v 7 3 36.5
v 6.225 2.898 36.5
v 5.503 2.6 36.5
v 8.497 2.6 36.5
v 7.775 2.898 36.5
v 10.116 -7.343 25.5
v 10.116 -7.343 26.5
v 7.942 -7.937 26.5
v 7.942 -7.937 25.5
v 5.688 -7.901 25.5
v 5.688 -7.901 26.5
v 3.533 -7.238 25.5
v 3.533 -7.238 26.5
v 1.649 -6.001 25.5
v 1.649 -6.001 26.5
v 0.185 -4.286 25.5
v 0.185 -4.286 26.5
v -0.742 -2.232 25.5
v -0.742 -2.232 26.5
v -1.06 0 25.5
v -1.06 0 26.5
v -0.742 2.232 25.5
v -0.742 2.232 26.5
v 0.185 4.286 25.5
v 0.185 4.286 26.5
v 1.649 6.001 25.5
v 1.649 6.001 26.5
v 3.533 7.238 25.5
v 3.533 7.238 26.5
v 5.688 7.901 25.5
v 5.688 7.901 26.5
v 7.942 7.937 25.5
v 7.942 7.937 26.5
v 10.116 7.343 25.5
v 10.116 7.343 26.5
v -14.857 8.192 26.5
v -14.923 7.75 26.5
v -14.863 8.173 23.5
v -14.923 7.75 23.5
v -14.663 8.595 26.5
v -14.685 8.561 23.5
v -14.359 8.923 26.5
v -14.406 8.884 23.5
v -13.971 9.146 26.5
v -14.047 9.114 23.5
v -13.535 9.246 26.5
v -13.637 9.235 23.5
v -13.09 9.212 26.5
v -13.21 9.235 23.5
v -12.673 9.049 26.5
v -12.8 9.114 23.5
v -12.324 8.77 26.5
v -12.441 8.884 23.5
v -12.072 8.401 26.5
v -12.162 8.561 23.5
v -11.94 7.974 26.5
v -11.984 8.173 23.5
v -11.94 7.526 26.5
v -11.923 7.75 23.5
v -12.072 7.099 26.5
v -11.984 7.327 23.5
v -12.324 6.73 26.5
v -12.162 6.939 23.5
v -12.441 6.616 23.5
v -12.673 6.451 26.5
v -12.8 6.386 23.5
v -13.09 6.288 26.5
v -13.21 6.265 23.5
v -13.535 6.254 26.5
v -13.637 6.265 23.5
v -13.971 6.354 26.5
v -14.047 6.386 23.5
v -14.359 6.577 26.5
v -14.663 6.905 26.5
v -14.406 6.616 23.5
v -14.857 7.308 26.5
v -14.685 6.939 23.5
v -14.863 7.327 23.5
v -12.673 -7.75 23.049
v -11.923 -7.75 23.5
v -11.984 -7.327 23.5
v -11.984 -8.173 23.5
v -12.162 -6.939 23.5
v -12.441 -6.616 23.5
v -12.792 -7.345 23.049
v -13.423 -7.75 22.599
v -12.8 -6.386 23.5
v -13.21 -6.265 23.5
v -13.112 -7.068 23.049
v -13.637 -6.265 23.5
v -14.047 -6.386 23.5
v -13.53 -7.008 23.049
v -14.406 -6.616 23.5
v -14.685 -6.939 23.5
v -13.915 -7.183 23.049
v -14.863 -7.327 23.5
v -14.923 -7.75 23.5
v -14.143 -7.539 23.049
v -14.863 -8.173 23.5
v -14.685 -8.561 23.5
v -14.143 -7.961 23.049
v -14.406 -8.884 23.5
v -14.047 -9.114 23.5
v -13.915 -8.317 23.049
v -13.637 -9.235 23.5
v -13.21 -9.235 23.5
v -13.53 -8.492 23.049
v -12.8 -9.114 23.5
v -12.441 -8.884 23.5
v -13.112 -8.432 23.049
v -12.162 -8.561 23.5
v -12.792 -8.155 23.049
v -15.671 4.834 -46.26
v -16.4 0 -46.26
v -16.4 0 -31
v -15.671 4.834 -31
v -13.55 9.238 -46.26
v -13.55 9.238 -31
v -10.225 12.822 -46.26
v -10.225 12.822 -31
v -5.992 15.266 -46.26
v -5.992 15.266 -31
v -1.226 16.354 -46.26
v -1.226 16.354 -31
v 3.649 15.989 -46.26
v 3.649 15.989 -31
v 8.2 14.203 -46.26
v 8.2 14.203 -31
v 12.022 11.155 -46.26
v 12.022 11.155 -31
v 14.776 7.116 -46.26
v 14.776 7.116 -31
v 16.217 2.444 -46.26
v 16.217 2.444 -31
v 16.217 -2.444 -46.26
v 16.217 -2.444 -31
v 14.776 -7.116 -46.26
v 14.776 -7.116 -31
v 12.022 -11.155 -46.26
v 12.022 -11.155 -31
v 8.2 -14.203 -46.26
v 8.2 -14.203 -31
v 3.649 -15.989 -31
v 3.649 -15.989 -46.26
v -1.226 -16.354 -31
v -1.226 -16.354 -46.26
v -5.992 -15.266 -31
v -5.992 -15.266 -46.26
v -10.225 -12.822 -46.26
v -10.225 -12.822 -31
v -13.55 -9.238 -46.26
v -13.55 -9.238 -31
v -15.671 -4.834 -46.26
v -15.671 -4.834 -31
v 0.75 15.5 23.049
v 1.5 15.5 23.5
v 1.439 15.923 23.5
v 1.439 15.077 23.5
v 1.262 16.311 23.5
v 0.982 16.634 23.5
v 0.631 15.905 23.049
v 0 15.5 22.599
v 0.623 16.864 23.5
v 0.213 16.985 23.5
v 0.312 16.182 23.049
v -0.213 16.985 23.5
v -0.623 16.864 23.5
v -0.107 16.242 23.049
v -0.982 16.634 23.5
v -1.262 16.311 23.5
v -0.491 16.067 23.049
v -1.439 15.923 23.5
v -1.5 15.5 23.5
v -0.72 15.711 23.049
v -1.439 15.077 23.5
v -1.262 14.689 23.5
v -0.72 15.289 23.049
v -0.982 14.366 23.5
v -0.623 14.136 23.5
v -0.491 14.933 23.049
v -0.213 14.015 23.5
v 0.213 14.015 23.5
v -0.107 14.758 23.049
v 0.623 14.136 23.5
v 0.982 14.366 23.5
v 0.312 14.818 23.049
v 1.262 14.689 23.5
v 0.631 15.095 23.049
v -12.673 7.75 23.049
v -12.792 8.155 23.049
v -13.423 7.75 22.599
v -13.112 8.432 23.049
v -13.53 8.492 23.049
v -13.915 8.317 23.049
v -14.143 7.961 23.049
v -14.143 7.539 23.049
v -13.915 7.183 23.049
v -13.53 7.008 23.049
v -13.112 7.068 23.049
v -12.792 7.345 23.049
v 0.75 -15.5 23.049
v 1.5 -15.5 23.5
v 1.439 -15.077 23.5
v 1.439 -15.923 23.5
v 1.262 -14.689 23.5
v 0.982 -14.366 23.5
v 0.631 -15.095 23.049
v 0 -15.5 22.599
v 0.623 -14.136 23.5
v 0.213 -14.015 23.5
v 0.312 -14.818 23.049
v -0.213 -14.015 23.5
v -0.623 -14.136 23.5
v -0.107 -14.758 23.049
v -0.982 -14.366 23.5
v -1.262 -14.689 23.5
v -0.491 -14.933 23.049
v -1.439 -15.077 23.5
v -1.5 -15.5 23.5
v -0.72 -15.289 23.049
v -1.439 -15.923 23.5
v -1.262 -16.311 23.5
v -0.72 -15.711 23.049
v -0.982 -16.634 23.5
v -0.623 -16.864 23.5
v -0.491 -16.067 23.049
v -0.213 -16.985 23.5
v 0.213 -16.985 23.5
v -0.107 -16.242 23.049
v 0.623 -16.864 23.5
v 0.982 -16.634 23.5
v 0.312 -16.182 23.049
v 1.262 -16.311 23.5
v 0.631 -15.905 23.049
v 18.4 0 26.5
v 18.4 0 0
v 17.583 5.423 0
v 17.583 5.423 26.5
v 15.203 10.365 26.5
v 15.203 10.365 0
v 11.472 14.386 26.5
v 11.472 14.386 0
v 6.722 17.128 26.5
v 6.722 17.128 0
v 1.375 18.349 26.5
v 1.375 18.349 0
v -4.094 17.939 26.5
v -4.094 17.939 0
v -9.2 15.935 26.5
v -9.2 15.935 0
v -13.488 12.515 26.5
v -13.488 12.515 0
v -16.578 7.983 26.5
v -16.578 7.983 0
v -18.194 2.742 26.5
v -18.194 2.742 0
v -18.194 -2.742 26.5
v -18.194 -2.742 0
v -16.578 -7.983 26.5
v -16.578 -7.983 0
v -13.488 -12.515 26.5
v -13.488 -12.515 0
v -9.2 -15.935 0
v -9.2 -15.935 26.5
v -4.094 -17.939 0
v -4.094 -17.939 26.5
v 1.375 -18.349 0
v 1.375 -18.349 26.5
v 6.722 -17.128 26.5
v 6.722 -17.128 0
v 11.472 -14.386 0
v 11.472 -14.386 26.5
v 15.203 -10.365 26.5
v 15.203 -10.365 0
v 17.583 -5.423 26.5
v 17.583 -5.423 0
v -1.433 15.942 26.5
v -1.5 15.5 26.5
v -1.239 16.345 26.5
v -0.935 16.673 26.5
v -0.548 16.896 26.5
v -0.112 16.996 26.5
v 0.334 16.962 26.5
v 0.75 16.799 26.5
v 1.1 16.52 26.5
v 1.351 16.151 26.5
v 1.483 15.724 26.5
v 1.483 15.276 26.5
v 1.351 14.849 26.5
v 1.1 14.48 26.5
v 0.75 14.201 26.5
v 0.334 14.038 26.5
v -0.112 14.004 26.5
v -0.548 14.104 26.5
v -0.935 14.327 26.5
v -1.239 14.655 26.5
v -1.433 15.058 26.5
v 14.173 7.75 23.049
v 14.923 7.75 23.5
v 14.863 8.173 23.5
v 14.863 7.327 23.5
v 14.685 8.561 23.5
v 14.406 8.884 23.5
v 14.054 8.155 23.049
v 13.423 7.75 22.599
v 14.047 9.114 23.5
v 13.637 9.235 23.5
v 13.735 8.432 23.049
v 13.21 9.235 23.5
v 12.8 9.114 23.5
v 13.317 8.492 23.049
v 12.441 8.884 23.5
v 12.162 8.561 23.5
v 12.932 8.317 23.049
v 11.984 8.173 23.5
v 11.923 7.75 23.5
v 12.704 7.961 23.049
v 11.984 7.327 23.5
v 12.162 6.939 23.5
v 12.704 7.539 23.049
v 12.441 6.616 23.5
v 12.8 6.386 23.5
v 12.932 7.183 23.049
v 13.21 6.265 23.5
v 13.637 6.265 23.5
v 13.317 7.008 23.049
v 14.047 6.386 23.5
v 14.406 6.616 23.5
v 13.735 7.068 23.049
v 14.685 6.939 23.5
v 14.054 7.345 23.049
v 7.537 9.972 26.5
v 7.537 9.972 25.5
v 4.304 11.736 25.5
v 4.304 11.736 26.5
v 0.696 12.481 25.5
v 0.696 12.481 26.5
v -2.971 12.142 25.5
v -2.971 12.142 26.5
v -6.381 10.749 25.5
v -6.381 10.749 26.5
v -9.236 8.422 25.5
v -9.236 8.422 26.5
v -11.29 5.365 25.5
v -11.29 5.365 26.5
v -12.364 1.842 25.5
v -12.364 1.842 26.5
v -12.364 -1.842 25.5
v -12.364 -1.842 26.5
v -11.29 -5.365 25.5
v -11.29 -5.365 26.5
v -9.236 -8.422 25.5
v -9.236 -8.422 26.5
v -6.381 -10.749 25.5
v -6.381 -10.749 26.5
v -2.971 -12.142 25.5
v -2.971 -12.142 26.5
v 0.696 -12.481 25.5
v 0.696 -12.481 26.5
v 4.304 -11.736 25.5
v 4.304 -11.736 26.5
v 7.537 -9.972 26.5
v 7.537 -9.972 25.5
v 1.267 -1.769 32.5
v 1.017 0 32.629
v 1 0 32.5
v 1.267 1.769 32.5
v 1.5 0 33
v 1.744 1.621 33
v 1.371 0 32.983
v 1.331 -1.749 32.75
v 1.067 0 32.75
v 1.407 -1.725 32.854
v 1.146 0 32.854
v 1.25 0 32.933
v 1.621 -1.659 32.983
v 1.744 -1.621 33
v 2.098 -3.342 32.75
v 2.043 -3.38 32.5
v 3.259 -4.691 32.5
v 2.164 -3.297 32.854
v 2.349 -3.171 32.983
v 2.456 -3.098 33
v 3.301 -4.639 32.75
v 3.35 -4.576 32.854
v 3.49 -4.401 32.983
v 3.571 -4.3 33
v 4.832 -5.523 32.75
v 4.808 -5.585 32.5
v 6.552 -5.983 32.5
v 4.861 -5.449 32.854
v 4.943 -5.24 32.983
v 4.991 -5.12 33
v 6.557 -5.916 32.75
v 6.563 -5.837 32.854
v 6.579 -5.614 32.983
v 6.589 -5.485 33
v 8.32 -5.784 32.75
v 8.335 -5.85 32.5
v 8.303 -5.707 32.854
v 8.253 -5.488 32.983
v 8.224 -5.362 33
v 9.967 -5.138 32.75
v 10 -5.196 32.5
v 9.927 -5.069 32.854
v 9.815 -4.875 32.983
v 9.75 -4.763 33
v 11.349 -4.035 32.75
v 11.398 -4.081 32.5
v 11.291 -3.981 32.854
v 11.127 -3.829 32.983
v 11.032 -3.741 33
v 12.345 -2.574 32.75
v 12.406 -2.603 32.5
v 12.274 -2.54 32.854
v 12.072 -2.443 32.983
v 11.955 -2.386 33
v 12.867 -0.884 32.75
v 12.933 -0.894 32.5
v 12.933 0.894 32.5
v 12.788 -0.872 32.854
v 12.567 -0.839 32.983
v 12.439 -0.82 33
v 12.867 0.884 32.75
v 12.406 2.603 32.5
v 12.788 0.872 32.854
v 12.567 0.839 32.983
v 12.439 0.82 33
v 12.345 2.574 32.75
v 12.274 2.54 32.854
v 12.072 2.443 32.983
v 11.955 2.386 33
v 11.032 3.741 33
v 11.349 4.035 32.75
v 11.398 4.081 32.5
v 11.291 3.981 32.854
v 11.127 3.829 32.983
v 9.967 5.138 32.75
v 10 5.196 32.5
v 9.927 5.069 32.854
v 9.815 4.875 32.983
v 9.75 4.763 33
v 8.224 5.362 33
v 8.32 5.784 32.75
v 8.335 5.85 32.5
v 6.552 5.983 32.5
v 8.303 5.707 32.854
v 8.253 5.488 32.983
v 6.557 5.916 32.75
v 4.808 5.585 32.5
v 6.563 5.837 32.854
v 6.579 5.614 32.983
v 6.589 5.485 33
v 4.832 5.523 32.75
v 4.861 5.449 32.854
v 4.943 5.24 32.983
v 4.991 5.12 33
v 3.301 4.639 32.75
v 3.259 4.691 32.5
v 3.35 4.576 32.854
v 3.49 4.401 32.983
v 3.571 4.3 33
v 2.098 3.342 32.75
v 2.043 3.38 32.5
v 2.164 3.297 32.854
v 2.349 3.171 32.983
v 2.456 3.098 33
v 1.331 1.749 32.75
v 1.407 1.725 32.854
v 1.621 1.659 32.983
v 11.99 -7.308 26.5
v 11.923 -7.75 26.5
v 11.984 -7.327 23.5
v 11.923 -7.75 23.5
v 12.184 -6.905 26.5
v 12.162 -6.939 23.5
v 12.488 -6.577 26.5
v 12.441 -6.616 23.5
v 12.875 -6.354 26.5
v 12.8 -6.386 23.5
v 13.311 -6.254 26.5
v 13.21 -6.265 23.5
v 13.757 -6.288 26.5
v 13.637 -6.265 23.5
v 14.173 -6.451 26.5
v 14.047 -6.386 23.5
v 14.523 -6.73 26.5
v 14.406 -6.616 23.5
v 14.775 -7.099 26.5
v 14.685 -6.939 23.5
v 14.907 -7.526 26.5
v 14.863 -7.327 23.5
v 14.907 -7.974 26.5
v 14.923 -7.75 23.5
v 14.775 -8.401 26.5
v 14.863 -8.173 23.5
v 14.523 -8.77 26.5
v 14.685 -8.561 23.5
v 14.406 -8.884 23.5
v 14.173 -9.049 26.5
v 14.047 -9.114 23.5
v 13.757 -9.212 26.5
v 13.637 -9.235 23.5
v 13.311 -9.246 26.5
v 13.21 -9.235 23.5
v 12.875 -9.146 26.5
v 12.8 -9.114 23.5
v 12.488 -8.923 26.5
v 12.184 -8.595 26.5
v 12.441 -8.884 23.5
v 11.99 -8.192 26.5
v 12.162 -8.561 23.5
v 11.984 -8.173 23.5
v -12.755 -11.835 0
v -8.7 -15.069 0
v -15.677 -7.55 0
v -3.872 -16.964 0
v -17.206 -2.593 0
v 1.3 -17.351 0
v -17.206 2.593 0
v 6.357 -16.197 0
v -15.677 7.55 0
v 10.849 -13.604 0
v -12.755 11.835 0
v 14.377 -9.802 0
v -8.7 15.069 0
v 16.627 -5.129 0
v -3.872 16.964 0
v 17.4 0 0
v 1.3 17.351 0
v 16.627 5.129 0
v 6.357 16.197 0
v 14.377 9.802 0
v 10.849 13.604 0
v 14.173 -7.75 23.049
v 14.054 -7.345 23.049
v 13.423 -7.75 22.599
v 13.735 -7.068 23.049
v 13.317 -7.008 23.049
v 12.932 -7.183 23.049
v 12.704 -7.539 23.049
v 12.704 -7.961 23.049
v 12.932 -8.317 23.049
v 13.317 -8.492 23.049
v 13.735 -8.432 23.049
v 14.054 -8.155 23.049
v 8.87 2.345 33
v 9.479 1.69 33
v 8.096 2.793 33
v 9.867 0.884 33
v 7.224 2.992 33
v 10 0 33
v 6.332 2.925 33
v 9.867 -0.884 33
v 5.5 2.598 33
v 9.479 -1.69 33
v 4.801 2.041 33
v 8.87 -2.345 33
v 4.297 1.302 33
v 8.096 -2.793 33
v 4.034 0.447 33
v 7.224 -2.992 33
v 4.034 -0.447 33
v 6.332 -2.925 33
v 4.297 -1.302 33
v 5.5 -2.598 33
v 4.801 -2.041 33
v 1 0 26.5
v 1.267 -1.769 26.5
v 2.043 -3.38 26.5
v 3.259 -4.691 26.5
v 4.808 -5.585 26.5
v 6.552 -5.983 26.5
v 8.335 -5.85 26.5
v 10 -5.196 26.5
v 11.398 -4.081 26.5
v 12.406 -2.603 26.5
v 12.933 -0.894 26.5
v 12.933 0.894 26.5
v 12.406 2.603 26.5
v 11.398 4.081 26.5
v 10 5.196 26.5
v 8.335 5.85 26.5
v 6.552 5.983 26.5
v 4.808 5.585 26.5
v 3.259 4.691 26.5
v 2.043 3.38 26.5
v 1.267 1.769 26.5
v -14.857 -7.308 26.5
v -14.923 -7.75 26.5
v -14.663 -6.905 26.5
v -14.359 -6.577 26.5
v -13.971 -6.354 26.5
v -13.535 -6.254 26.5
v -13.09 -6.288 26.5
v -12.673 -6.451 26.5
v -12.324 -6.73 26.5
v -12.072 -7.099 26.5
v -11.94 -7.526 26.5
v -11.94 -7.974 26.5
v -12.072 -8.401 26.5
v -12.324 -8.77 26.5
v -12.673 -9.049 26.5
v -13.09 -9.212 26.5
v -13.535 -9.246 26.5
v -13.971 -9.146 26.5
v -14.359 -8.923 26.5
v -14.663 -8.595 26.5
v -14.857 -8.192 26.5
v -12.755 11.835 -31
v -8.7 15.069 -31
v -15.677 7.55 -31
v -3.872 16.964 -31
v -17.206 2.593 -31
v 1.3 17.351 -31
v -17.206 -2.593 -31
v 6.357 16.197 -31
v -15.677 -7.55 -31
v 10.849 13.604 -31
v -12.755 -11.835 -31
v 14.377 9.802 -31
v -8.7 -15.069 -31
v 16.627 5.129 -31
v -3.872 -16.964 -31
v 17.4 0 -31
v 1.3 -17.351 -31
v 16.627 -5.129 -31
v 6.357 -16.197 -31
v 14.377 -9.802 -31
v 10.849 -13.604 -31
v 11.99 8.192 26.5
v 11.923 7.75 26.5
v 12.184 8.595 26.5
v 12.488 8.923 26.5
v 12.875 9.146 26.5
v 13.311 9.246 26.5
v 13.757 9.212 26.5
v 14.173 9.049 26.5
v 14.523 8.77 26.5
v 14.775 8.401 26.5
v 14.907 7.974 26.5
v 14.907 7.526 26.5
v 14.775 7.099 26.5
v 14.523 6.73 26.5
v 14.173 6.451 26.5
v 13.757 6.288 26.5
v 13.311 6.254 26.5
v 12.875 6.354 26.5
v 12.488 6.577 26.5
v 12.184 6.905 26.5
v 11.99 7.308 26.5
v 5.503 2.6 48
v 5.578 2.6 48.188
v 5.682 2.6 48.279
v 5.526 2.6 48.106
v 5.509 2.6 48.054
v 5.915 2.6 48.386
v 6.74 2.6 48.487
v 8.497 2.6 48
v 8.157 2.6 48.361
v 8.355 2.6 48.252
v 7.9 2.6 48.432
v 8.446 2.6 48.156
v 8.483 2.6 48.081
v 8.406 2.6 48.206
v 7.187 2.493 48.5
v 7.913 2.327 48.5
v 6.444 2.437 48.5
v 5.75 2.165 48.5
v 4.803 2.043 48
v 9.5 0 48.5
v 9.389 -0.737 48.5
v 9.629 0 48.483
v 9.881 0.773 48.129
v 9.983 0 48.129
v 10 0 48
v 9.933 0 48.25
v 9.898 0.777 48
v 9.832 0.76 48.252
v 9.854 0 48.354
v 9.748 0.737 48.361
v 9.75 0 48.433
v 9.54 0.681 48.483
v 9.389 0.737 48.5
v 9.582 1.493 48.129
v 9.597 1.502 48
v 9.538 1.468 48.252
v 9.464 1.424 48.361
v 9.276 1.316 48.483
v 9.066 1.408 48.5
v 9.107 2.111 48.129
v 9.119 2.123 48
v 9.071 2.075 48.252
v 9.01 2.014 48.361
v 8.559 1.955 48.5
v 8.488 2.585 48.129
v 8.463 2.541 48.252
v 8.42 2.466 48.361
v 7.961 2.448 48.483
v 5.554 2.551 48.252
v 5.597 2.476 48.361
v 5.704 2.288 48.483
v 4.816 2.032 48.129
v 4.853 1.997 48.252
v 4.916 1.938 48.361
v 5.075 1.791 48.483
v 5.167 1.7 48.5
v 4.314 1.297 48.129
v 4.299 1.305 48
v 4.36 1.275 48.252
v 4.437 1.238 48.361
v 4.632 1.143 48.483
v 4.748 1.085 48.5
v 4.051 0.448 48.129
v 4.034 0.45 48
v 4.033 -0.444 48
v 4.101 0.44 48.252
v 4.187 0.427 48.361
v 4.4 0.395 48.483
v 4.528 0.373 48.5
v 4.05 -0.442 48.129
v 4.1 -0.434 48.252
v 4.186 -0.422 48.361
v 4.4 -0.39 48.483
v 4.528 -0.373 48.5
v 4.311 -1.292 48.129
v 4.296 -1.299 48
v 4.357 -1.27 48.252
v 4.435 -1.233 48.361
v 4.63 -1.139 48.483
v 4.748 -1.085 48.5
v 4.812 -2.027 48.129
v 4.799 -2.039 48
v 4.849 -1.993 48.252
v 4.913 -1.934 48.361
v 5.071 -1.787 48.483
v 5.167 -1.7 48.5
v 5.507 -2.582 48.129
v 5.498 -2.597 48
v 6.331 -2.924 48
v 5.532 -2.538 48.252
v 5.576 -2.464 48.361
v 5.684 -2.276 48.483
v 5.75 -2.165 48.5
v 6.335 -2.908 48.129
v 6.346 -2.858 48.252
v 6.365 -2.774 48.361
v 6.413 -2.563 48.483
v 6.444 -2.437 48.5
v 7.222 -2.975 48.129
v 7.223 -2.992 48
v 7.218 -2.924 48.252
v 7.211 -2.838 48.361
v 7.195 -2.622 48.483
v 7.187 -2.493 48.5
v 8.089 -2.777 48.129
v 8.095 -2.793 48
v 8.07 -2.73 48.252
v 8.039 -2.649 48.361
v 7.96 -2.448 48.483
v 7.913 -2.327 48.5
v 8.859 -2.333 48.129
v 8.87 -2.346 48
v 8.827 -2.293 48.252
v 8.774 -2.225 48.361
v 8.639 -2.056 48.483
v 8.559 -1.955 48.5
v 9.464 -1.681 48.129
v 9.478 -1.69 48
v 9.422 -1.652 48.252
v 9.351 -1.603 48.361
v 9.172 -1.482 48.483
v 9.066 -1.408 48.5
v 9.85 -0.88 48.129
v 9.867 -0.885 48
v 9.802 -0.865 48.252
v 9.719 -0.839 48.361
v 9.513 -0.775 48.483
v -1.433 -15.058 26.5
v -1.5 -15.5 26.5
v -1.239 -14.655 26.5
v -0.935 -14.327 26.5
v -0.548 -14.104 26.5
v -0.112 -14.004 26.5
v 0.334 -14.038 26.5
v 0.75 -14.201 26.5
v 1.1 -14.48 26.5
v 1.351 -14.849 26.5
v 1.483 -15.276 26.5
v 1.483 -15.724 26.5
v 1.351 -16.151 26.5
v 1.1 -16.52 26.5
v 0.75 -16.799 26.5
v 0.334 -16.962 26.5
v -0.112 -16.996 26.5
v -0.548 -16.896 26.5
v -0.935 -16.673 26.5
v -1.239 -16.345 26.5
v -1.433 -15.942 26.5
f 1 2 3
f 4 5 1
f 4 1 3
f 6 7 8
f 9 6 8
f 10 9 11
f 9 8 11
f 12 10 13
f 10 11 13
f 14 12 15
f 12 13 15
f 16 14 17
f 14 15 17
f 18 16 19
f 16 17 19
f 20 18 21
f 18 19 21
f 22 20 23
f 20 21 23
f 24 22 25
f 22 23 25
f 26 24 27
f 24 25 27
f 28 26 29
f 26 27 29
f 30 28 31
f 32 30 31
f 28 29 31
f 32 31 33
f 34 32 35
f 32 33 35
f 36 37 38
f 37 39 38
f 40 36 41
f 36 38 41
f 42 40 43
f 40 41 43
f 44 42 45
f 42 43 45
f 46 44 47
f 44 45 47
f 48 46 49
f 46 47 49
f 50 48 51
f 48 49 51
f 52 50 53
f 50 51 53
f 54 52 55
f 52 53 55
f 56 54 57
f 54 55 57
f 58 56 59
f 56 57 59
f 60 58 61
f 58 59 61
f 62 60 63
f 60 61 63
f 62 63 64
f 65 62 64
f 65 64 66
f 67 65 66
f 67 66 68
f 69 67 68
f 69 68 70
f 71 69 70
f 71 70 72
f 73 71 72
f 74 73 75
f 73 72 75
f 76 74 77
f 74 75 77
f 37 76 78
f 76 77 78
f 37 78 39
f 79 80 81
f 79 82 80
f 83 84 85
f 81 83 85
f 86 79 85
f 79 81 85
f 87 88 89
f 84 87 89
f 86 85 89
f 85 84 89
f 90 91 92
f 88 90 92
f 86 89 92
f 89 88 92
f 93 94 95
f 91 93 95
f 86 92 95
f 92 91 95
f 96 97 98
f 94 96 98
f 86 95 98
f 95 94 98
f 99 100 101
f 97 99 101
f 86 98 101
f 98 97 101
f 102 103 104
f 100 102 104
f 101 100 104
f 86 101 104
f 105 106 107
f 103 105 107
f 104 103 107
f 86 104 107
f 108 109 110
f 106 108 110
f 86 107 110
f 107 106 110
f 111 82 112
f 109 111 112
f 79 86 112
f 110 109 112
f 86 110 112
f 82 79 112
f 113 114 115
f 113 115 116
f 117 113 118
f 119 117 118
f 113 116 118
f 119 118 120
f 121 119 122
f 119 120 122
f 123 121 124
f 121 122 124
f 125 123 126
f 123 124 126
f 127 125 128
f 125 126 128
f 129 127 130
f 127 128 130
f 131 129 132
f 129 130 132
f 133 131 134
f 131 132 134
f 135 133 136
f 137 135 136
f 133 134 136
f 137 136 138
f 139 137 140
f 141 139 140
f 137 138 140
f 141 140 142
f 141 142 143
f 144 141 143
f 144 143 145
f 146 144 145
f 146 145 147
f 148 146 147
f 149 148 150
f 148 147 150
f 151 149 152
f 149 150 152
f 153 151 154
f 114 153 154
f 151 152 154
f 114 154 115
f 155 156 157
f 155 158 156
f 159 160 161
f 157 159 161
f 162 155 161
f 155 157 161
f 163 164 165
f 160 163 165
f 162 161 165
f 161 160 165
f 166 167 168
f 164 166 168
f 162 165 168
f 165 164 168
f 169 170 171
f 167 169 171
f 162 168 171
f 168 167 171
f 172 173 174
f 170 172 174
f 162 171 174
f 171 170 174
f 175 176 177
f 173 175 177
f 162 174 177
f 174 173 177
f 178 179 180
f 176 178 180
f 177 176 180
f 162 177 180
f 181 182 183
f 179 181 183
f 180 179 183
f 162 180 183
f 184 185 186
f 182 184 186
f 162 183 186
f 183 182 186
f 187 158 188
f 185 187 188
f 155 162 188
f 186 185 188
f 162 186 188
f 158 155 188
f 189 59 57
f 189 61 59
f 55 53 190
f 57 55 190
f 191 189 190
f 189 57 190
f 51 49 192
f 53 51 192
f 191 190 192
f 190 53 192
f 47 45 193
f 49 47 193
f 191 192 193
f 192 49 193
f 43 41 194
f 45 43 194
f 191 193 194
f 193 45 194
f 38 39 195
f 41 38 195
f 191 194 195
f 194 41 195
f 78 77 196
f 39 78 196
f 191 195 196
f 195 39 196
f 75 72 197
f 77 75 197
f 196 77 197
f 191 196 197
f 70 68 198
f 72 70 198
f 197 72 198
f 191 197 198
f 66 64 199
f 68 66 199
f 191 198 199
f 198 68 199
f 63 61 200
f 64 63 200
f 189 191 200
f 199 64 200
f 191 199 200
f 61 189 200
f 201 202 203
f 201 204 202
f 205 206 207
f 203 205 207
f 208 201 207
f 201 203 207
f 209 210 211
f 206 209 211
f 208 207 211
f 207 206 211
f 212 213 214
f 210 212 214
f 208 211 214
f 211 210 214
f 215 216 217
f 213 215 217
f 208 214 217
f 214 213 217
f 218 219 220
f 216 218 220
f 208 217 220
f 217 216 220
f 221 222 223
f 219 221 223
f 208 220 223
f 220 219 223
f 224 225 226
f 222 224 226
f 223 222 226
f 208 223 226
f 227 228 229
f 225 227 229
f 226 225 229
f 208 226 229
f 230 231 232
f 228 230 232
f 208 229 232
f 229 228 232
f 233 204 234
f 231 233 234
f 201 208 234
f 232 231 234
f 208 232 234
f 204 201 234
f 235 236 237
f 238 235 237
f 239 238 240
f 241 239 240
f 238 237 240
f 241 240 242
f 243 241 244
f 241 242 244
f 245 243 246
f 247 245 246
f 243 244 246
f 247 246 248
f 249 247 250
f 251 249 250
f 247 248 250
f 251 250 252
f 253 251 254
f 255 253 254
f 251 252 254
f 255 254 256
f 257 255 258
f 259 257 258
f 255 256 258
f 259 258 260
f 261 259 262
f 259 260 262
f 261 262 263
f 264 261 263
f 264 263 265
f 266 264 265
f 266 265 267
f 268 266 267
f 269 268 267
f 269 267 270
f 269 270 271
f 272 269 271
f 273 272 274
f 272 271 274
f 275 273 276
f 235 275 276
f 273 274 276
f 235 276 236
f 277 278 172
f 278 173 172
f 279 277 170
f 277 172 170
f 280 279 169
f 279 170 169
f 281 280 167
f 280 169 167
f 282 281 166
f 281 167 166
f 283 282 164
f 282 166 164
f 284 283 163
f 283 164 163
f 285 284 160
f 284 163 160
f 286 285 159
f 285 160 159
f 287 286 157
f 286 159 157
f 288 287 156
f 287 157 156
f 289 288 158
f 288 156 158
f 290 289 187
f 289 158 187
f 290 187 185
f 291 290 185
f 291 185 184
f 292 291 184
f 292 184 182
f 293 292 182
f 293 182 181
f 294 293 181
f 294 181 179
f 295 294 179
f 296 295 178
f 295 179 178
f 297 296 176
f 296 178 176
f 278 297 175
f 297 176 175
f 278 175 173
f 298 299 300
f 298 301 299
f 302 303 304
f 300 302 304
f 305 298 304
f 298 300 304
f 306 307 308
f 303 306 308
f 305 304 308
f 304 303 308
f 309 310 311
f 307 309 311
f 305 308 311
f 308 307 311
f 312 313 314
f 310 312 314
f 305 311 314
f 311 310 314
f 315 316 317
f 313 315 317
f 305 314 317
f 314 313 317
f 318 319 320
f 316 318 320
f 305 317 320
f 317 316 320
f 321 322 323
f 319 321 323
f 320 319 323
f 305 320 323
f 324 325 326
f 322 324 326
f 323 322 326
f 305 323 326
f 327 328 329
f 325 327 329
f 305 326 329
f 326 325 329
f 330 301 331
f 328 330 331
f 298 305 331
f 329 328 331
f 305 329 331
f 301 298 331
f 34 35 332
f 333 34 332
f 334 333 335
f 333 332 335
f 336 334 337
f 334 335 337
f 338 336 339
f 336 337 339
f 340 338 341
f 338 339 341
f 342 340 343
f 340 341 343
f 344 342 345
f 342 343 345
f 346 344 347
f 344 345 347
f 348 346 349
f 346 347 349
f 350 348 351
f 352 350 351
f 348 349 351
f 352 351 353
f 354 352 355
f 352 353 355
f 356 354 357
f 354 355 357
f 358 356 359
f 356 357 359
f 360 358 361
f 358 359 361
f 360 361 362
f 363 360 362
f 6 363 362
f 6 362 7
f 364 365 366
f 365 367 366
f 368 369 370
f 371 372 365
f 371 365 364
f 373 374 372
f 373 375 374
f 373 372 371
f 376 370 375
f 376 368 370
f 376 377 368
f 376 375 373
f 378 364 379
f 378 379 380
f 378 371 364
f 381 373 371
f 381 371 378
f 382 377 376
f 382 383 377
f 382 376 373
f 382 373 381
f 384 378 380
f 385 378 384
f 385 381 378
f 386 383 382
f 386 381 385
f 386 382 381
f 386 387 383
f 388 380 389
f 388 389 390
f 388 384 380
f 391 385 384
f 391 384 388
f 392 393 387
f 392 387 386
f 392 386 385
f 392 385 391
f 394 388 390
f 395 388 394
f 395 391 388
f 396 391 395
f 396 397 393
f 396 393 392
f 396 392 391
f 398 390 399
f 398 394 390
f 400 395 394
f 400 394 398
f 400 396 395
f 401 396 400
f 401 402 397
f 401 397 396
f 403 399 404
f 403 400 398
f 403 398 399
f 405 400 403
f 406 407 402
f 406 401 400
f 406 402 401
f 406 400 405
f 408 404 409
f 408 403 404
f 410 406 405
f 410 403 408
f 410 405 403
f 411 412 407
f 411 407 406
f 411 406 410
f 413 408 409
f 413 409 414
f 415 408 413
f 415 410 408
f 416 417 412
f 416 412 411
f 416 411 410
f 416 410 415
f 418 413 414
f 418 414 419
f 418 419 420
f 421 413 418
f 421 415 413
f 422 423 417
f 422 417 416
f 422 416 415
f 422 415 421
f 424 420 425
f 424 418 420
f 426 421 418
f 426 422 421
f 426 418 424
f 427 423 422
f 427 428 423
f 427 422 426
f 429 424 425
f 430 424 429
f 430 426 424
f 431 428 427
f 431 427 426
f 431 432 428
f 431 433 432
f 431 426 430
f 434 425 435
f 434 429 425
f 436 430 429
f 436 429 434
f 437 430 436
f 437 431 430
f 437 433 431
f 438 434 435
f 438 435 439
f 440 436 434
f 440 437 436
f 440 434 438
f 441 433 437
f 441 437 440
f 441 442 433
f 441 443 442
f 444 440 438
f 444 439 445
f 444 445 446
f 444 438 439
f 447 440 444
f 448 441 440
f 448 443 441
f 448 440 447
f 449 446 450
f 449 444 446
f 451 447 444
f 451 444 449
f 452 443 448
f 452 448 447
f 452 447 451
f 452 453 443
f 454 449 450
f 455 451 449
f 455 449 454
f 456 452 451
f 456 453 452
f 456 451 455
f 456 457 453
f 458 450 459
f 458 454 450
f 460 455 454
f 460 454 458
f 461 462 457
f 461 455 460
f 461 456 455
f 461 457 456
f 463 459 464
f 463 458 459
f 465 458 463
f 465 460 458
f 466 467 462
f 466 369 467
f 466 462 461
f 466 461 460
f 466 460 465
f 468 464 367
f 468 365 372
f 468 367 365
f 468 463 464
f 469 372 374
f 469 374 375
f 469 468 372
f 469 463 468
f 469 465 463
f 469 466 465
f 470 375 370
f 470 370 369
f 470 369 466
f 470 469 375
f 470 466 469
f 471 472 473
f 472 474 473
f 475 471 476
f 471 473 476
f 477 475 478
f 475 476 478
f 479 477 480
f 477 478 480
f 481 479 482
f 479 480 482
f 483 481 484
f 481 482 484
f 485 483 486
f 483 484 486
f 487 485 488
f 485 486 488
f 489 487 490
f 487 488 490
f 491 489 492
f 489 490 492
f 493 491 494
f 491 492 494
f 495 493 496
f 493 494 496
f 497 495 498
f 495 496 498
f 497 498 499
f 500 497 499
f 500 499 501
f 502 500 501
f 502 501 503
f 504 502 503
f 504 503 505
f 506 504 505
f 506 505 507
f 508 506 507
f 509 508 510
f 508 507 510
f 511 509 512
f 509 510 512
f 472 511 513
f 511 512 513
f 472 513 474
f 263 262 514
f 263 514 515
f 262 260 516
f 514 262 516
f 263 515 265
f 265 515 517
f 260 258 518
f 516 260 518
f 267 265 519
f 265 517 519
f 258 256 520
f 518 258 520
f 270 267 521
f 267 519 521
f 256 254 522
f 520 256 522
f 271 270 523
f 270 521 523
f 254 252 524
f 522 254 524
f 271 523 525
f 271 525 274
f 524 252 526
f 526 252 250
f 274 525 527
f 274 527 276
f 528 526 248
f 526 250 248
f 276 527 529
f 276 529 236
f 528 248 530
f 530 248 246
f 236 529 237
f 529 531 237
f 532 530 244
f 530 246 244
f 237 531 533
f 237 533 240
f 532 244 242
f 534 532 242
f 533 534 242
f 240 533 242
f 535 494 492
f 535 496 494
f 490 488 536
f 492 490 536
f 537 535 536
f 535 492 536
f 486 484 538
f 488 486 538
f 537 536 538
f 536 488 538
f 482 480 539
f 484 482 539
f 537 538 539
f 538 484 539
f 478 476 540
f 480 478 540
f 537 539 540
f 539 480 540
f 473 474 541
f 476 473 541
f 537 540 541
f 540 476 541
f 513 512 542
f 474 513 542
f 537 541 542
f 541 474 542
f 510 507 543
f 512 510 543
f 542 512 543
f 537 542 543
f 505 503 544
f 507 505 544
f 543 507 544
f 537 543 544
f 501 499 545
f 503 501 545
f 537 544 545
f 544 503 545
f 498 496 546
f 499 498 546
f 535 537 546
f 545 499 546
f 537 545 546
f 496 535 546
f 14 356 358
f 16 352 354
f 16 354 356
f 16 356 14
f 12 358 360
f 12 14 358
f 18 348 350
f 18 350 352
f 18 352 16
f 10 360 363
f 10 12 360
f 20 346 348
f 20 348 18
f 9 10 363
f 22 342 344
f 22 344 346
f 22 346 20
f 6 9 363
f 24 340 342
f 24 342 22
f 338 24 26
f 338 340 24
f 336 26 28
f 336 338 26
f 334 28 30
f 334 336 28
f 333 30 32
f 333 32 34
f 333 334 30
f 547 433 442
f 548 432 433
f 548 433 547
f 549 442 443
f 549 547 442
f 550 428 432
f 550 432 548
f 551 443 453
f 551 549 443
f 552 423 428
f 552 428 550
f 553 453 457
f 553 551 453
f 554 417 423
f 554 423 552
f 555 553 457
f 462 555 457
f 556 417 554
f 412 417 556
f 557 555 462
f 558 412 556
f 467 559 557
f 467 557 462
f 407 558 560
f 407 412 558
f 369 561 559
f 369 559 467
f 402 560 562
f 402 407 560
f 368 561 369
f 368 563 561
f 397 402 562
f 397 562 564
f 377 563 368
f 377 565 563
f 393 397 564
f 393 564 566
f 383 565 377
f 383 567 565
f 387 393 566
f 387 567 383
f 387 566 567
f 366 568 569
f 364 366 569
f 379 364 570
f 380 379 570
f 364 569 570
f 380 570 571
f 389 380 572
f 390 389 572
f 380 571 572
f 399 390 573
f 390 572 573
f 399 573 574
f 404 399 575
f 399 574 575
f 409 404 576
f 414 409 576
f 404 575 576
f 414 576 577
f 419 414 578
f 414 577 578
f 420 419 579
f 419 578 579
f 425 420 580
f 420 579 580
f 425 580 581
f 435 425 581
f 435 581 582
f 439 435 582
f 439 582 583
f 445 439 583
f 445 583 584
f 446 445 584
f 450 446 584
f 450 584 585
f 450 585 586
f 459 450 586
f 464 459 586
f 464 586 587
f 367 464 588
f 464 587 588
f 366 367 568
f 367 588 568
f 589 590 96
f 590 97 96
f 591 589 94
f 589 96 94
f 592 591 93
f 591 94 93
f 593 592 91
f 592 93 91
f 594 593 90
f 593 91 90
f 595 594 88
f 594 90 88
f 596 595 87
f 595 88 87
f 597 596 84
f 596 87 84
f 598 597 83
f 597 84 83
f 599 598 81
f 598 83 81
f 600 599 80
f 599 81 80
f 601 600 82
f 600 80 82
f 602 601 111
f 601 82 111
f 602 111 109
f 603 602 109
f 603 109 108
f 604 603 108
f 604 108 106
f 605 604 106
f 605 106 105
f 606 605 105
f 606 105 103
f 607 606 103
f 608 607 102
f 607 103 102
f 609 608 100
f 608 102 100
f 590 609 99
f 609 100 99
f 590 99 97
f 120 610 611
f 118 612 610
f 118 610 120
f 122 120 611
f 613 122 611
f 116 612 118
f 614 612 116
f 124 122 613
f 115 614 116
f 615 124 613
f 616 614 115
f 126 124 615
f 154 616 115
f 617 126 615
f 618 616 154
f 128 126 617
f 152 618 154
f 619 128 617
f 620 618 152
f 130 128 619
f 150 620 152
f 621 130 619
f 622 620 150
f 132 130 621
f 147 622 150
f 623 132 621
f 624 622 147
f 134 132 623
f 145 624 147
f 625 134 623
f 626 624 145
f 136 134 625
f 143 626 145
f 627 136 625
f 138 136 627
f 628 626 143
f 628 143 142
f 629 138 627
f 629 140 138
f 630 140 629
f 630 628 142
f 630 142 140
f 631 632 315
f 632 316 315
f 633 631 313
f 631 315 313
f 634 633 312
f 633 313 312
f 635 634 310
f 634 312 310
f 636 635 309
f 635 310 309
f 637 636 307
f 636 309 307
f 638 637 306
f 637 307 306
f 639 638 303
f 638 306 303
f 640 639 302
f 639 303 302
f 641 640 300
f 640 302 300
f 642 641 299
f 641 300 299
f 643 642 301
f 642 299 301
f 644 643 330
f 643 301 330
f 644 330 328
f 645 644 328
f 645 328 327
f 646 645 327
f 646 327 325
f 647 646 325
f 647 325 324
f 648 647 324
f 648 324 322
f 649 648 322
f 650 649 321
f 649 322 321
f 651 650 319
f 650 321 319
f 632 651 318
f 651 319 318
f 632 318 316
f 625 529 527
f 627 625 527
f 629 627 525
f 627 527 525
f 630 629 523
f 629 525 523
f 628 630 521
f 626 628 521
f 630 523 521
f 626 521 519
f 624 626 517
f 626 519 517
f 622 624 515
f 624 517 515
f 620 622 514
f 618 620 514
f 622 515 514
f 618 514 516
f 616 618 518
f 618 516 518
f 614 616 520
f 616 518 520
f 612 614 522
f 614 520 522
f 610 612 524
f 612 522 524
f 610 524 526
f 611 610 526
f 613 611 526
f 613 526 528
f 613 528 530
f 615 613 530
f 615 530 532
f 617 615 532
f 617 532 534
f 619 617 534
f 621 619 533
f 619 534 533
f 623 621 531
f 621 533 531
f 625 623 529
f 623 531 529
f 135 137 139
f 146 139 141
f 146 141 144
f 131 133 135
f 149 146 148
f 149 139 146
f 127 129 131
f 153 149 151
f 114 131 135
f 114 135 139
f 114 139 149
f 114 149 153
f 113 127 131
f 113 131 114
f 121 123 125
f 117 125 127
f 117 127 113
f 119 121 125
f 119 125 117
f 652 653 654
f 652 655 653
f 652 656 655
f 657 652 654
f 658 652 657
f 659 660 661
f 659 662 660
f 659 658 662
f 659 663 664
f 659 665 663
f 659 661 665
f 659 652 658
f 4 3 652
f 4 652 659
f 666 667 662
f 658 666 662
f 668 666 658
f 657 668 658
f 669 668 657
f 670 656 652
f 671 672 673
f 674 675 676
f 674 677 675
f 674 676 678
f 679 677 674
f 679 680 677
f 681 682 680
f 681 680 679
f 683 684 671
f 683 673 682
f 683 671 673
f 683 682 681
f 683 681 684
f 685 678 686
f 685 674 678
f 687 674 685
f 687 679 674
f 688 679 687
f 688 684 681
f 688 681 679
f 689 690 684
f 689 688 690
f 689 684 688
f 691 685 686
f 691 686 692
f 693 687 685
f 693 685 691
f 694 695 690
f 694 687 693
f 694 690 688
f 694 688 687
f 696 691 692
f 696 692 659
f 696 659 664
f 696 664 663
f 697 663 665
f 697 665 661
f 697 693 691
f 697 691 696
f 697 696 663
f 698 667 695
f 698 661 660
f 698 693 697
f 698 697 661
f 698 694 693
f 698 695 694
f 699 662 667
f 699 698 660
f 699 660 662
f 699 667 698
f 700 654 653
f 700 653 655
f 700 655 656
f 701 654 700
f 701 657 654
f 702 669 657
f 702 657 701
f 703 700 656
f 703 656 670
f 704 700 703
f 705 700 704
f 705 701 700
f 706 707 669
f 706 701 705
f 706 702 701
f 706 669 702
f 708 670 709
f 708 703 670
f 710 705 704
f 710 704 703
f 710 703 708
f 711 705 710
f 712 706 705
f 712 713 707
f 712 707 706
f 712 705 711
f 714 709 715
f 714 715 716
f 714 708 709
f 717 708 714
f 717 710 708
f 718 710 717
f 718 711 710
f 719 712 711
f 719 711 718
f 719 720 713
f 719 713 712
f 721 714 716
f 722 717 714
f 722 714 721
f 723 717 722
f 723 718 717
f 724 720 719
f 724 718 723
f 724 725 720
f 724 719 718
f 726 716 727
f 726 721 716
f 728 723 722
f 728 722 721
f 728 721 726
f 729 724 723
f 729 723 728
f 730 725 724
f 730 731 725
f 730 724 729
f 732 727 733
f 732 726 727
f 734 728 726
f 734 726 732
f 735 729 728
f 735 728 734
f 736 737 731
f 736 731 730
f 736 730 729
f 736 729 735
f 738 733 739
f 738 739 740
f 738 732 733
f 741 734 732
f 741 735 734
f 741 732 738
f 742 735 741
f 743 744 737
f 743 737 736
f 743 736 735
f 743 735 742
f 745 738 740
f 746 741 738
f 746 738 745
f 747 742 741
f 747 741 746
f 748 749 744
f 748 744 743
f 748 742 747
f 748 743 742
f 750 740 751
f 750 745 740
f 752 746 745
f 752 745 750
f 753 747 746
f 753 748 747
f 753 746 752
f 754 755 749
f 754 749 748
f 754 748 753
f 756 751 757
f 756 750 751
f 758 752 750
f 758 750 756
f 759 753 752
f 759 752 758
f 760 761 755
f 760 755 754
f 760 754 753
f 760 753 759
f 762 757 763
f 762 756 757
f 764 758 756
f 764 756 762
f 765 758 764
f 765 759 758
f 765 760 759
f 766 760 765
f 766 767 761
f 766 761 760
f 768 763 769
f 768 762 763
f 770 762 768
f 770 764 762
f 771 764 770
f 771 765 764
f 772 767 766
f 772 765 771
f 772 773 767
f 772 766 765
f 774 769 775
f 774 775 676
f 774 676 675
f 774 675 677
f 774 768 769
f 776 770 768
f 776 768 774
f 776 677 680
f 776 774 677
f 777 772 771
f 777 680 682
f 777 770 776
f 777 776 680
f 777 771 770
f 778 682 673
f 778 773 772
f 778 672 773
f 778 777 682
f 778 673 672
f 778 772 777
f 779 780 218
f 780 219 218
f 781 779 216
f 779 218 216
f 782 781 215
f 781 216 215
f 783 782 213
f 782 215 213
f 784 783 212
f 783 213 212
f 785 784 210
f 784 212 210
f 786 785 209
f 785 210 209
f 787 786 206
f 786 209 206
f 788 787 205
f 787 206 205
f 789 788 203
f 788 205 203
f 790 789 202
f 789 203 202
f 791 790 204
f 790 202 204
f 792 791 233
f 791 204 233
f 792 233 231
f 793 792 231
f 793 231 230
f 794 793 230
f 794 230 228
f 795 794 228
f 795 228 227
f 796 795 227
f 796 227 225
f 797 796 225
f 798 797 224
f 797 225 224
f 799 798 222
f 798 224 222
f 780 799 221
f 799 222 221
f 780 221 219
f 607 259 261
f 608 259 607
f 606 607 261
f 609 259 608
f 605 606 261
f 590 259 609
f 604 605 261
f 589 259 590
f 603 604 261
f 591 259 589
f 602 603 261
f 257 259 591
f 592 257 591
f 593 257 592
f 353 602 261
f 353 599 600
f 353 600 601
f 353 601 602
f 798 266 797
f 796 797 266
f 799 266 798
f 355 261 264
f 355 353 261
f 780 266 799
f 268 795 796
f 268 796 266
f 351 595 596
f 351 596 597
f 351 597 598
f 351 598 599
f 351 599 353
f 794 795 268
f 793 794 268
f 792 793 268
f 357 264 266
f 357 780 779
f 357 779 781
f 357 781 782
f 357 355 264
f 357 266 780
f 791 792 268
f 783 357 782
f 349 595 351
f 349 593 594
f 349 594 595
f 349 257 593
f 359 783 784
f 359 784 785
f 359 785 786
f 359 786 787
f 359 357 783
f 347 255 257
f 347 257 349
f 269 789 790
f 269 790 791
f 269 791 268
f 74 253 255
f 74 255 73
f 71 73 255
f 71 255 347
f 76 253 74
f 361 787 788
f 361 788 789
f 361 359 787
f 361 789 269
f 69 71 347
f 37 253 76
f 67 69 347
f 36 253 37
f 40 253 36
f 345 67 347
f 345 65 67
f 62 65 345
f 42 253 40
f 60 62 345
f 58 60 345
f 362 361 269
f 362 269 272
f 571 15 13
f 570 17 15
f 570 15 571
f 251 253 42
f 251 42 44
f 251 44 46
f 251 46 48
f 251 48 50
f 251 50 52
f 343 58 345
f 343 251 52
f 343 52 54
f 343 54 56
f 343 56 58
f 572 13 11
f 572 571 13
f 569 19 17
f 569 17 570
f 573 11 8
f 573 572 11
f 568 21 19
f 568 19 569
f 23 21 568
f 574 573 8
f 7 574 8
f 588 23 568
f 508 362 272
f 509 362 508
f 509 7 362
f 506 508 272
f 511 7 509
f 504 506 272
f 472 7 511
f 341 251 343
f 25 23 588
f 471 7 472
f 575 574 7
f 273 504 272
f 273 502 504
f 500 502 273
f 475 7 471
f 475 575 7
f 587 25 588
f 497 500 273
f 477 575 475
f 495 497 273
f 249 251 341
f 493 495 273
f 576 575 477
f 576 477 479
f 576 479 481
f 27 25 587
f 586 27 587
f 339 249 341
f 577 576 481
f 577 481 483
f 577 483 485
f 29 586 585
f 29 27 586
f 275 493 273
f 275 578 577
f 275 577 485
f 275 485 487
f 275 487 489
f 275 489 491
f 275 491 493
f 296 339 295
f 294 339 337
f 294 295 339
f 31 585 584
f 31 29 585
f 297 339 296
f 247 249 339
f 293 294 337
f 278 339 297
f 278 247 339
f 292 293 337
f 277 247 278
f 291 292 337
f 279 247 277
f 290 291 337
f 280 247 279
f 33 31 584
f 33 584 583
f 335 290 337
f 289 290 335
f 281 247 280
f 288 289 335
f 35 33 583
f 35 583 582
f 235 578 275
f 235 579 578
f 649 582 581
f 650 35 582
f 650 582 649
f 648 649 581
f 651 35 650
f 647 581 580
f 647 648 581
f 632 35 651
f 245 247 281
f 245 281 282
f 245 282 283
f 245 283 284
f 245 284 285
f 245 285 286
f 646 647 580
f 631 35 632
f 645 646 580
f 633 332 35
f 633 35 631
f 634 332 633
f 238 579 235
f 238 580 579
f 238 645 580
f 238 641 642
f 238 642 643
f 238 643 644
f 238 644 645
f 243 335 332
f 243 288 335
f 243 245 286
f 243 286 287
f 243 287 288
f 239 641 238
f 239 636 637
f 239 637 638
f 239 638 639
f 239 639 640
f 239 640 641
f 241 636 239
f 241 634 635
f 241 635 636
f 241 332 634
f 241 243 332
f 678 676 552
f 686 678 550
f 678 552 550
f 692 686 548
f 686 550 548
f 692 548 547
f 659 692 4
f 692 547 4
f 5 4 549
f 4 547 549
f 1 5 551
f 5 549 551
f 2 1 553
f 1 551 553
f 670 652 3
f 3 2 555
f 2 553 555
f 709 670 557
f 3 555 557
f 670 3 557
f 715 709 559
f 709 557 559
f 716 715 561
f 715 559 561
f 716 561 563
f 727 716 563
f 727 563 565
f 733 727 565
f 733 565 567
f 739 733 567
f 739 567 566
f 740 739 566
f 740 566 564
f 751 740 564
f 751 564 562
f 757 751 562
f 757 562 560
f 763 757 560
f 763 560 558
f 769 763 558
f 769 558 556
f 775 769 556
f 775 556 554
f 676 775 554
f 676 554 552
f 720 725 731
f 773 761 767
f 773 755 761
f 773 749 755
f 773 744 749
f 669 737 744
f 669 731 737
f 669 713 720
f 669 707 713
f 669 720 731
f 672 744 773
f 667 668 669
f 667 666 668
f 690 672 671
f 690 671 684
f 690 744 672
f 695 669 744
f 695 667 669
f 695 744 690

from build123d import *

# Parameters (mm, degrees)
SKETCH1_R                    = 18.4
BOSS_EXTRUDE1_DEPTH          = 26.5
SKETCH2_R                    = 17.4
BOSS_EXTRUDE2_DEPTH          = 31
SKETCH3_R                    = 6
BOSS_EXTRUDE3_DEPTH          = 6.5
FILLET1_R                    = 0.5
SKETCH4_R                    = 3
BOSS_EXTRUDE4_DEPTH          = 15.5
CUT_EXTRUDE1_START           = -12
CUT_EXTRUDE1_DEPTH           = 12
F_3_0_3_DIAMETER_HOLE1_D     = 3
F_3_0_3_DIAMETER_HOLE1_DEPTH = 3
F_3_0_3_DIAMETER_HOLE1_TIP   = 0.901290929
CUT_EXTRUDE2_DEPTH           = 1
SKETCH9_R                    = 4
BOSS_EXTRUDE5_DEPTH          = 1
FILLET2_R                    = 0.5
SKETCH10_R                   = 14
BOSS_EXTRUDE6_DEPTH          = 1.5
SKETCH11_W                   = 3.5
SKETCH11_H                   = 1
BOSS_EXTRUDE7_DEPTH          = 5.6
FILLET3_R                    = 0.5
SKETCH13_R                   = 9
BOSS_EXTRUDE8_DEPTH          = 3
SKETCH14_R                   = 1.5
BOSS_EXTRUDE9_DEPTH          = 8.55
FILLET4_R                    = 0.5
SKETCH15_R                   = 16.4
BOSS_EXTRUDE10_DEPTH         = 15.26


with BuildPart() as part:
    # Sketch1 → Boss-Extrude1 (new body)
    with BuildSketch(Plane.XY):
        Circle(SKETCH1_R)
    extrude(amount=BOSS_EXTRUDE1_DEPTH)

    # Sketch2 → Boss-Extrude2 (add)
    with BuildSketch(Plane(origin=(0, 0, 0), x_dir=(-1, 0, 0), z_dir=(0, 0, -1))):
        with Locations(Location((0, 0, 0), (0, 0, 180))):
            Circle(SKETCH2_R)
    extrude(amount=BOSS_EXTRUDE2_DEPTH)

    # Sketch3 → Boss-Extrude3 (add)
    with BuildSketch(Plane.XY.offset(26.5)):
        with Locations(Location((7, 0, 0), (0, 0, 180))):
            Circle(SKETCH3_R)
    extrude(amount=BOSS_EXTRUDE3_DEPTH)

    # Fillet1
    fillet1_edges = [part.edges().sort_by_distance(p)[0] for p in [
        (13, 0, 33),
    ]]
    fillet(fillet1_edges, radius=FILLET1_R)

    # Sketch4 → Boss-Extrude4 (add)
    with BuildSketch(Plane.XY.offset(33)):
        with Locations((7, 0)):
            Circle(SKETCH4_R)
    extrude(amount=BOSS_EXTRUDE4_DEPTH)

    # Sketch5 → Cut-Extrude1 (cut)
    with BuildSketch(Plane.XY.offset(48.5).offset(CUT_EXTRUDE1_START)):
        with BuildLine():
            Line((5.503337045, 2.6), (8.496662955, 2.6))
            ThreePointArc((8.496662955, 2.6), (7, 3), (5.503337045, 2.6))
        make_face()
    extrude(amount=CUT_EXTRUDE1_DEPTH, mode=Mode.SUBTRACT)

    # Ø3.0 (3) Diameter Hole1
    with Locations(Plane.XY.offset(26.5)):
        with Locations((-13.423393759, 7.75), (-13.423393759, -7.75), (0, -15.5), (13.423393759, 7.75), (0, 15.5), (13.423393759, -7.75)):
            Hole(F_3_0_3_DIAMETER_HOLE1_D / 2, depth=F_3_0_3_DIAMETER_HOLE1_DEPTH)
            with Locations((0, 0, -(F_3_0_3_DIAMETER_HOLE1_DEPTH + F_3_0_3_DIAMETER_HOLE1_TIP / 2))):  # 118° drill point
                Cone(0, F_3_0_3_DIAMETER_HOLE1_D / 2, F_3_0_3_DIAMETER_HOLE1_TIP, mode=Mode.SUBTRACT)

    # Sketch8 → Cut-Extrude2 (cut)
    with BuildSketch(Plane.XY.offset(26.5)):
        with BuildLine():
            ThreePointArc((10.116155685, 7.342574083), (-12.5, 0), (10.116155685, -7.342574083))
            ThreePointArc((10.116155685, -7.342574083), (-1.05978604, 0), (10.116155685, 7.342574083))
        make_face()
    extrude(amount=-CUT_EXTRUDE2_DEPTH, mode=Mode.SUBTRACT)

    # Sketch9 → Boss-Extrude5 (add)
    with BuildSketch(Plane(origin=(0, 0, -31), x_dir=(-1, 0, 0), z_dir=(0, 0, -1))):
        Circle(SKETCH9_R)
    extrude(amount=BOSS_EXTRUDE5_DEPTH)

    # Fillet2
    fillet2_edges = [part.edges().sort_by_distance(p)[0] for p in [
        (4, 0, -32),
    ]]
    fillet(fillet2_edges, radius=FILLET2_R)

    # Sketch11 → Boss-Extrude7 (add)
    with BuildSketch(Plane(origin=(0, 0, -31), x_dir=(-1, 0, 0), z_dir=(0, 0, -1))):
        with Locations((0, 12.05)):
            Rectangle(SKETCH11_W, SKETCH11_H)
        with Locations((0, -12.05)):
            Rectangle(SKETCH11_W, SKETCH11_H)
    extrude(amount=BOSS_EXTRUDE7_DEPTH)

    # Fillet3
    fillet3_edges = [part.edges().sort_by_distance(p)[0] for p in [
        (1.75, 12.05, -36.6),
        (-1.75, 12.05, -36.6),
        (-1.75, -12.05, -36.6),
        (1.75, -12.05, -36.6),
    ]]
    fillet(fillet3_edges, radius=FILLET3_R)

    # Sketch14 → Boss-Extrude9 (add)
    with BuildSketch(Plane(origin=(0, 0, -32), x_dir=(-1, 0, 0), z_dir=(0, 0, -1))):
        Circle(SKETCH14_R)
    extrude(amount=BOSS_EXTRUDE9_DEPTH)

    # Fillet4
    # the kernel refuses this fillet: 0.5 mm, written as the material it takes off along each edge
    with BuildSketch(Plane(origin=(7, 0, 48.5), x_dir=(0.4622655728594592, 0.8867415295050277, 0), z_dir=(0.8867415295050277, -0.4622655728594592, 0))) as fillet4_piece_1:
        with BuildLine():
            CenterArc((3 - FILLET4_R, -FILLET4_R), FILLET4_R, 0, 90)
            Line((3 - FILLET4_R, 0), (3 - FILLET4_R, FILLET4_R * 0.02))
            Line((3 - FILLET4_R, FILLET4_R * 0.02), (3 + FILLET4_R * 0.02, FILLET4_R * 0.02))
            Line((3 + FILLET4_R * 0.02, FILLET4_R * 0.02), (3 + FILLET4_R * 0.02, -FILLET4_R))
            Line((3 + FILLET4_R * 0.02, -FILLET4_R), (3, -FILLET4_R))
        make_face()
    revolve(axis=Axis((7, 0, 48.5), (0, 0, 1)), revolution_arc=297.533397677, mode=Mode.SUBTRACT)
    with BuildSketch(Plane(origin=(7, 0, 48.5), x_dir=(1, 0, 0), z_dir=(0, -1, 0))) as fillet4_piece_2:
        with BuildLine():
            CenterArc((3 - FILLET4_R, -FILLET4_R), FILLET4_R, 0, 90)
            Line((3 - FILLET4_R, 0), (3 - FILLET4_R, FILLET4_R * 0.02))
            Line((3 - FILLET4_R, FILLET4_R * 0.02), (3 + FILLET4_R * 0.02, FILLET4_R * 0.02))
            Line((3 + FILLET4_R * 0.02, FILLET4_R * 0.02), (3 + FILLET4_R * 0.02, -FILLET4_R))
            Line((3 + FILLET4_R * 0.02, -FILLET4_R), (3, -FILLET4_R))
        make_face()
    revolve(axis=Axis((7, 0, 48.5), (0, 0, 1)), revolution_arc=117.379597562, mode=Mode.SUBTRACT)



with BuildPart() as body_2:
    # Sketch10 → Boss-Extrude6 (new body)
    with BuildSketch(Plane(origin=(0, 0, -34), x_dir=(-1, 0, 0), z_dir=(0, 0, -1))):
        Circle(SKETCH10_R)
    extrude(amount=BOSS_EXTRUDE6_DEPTH)


with BuildPart() as body_3:
    # Sketch13 → Boss-Extrude8 (new body)
    with BuildSketch(Plane(origin=(0, 0, -37.5), x_dir=(-1, 0, 0), z_dir=(0, 0, -1))):
        Circle(SKETCH13_R)
    extrude(amount=BOSS_EXTRUDE8_DEPTH)


with BuildPart() as part_1:
    add(part.part)

    add(body_2.part)  # Boss-Extrude10 merges body 2

    add(body_3.part)  # Boss-Extrude10 merges body 3
    # Sketch15 → Boss-Extrude10 (add)
    with BuildSketch(Plane(origin=(0, 0, -31), x_dir=(-1, 0, 0), z_dir=(0, 0, -1))):
        Circle(SKETCH15_R)
    extrude(amount=BOSS_EXTRUDE10_DEPTH)


solid = part_1.part
